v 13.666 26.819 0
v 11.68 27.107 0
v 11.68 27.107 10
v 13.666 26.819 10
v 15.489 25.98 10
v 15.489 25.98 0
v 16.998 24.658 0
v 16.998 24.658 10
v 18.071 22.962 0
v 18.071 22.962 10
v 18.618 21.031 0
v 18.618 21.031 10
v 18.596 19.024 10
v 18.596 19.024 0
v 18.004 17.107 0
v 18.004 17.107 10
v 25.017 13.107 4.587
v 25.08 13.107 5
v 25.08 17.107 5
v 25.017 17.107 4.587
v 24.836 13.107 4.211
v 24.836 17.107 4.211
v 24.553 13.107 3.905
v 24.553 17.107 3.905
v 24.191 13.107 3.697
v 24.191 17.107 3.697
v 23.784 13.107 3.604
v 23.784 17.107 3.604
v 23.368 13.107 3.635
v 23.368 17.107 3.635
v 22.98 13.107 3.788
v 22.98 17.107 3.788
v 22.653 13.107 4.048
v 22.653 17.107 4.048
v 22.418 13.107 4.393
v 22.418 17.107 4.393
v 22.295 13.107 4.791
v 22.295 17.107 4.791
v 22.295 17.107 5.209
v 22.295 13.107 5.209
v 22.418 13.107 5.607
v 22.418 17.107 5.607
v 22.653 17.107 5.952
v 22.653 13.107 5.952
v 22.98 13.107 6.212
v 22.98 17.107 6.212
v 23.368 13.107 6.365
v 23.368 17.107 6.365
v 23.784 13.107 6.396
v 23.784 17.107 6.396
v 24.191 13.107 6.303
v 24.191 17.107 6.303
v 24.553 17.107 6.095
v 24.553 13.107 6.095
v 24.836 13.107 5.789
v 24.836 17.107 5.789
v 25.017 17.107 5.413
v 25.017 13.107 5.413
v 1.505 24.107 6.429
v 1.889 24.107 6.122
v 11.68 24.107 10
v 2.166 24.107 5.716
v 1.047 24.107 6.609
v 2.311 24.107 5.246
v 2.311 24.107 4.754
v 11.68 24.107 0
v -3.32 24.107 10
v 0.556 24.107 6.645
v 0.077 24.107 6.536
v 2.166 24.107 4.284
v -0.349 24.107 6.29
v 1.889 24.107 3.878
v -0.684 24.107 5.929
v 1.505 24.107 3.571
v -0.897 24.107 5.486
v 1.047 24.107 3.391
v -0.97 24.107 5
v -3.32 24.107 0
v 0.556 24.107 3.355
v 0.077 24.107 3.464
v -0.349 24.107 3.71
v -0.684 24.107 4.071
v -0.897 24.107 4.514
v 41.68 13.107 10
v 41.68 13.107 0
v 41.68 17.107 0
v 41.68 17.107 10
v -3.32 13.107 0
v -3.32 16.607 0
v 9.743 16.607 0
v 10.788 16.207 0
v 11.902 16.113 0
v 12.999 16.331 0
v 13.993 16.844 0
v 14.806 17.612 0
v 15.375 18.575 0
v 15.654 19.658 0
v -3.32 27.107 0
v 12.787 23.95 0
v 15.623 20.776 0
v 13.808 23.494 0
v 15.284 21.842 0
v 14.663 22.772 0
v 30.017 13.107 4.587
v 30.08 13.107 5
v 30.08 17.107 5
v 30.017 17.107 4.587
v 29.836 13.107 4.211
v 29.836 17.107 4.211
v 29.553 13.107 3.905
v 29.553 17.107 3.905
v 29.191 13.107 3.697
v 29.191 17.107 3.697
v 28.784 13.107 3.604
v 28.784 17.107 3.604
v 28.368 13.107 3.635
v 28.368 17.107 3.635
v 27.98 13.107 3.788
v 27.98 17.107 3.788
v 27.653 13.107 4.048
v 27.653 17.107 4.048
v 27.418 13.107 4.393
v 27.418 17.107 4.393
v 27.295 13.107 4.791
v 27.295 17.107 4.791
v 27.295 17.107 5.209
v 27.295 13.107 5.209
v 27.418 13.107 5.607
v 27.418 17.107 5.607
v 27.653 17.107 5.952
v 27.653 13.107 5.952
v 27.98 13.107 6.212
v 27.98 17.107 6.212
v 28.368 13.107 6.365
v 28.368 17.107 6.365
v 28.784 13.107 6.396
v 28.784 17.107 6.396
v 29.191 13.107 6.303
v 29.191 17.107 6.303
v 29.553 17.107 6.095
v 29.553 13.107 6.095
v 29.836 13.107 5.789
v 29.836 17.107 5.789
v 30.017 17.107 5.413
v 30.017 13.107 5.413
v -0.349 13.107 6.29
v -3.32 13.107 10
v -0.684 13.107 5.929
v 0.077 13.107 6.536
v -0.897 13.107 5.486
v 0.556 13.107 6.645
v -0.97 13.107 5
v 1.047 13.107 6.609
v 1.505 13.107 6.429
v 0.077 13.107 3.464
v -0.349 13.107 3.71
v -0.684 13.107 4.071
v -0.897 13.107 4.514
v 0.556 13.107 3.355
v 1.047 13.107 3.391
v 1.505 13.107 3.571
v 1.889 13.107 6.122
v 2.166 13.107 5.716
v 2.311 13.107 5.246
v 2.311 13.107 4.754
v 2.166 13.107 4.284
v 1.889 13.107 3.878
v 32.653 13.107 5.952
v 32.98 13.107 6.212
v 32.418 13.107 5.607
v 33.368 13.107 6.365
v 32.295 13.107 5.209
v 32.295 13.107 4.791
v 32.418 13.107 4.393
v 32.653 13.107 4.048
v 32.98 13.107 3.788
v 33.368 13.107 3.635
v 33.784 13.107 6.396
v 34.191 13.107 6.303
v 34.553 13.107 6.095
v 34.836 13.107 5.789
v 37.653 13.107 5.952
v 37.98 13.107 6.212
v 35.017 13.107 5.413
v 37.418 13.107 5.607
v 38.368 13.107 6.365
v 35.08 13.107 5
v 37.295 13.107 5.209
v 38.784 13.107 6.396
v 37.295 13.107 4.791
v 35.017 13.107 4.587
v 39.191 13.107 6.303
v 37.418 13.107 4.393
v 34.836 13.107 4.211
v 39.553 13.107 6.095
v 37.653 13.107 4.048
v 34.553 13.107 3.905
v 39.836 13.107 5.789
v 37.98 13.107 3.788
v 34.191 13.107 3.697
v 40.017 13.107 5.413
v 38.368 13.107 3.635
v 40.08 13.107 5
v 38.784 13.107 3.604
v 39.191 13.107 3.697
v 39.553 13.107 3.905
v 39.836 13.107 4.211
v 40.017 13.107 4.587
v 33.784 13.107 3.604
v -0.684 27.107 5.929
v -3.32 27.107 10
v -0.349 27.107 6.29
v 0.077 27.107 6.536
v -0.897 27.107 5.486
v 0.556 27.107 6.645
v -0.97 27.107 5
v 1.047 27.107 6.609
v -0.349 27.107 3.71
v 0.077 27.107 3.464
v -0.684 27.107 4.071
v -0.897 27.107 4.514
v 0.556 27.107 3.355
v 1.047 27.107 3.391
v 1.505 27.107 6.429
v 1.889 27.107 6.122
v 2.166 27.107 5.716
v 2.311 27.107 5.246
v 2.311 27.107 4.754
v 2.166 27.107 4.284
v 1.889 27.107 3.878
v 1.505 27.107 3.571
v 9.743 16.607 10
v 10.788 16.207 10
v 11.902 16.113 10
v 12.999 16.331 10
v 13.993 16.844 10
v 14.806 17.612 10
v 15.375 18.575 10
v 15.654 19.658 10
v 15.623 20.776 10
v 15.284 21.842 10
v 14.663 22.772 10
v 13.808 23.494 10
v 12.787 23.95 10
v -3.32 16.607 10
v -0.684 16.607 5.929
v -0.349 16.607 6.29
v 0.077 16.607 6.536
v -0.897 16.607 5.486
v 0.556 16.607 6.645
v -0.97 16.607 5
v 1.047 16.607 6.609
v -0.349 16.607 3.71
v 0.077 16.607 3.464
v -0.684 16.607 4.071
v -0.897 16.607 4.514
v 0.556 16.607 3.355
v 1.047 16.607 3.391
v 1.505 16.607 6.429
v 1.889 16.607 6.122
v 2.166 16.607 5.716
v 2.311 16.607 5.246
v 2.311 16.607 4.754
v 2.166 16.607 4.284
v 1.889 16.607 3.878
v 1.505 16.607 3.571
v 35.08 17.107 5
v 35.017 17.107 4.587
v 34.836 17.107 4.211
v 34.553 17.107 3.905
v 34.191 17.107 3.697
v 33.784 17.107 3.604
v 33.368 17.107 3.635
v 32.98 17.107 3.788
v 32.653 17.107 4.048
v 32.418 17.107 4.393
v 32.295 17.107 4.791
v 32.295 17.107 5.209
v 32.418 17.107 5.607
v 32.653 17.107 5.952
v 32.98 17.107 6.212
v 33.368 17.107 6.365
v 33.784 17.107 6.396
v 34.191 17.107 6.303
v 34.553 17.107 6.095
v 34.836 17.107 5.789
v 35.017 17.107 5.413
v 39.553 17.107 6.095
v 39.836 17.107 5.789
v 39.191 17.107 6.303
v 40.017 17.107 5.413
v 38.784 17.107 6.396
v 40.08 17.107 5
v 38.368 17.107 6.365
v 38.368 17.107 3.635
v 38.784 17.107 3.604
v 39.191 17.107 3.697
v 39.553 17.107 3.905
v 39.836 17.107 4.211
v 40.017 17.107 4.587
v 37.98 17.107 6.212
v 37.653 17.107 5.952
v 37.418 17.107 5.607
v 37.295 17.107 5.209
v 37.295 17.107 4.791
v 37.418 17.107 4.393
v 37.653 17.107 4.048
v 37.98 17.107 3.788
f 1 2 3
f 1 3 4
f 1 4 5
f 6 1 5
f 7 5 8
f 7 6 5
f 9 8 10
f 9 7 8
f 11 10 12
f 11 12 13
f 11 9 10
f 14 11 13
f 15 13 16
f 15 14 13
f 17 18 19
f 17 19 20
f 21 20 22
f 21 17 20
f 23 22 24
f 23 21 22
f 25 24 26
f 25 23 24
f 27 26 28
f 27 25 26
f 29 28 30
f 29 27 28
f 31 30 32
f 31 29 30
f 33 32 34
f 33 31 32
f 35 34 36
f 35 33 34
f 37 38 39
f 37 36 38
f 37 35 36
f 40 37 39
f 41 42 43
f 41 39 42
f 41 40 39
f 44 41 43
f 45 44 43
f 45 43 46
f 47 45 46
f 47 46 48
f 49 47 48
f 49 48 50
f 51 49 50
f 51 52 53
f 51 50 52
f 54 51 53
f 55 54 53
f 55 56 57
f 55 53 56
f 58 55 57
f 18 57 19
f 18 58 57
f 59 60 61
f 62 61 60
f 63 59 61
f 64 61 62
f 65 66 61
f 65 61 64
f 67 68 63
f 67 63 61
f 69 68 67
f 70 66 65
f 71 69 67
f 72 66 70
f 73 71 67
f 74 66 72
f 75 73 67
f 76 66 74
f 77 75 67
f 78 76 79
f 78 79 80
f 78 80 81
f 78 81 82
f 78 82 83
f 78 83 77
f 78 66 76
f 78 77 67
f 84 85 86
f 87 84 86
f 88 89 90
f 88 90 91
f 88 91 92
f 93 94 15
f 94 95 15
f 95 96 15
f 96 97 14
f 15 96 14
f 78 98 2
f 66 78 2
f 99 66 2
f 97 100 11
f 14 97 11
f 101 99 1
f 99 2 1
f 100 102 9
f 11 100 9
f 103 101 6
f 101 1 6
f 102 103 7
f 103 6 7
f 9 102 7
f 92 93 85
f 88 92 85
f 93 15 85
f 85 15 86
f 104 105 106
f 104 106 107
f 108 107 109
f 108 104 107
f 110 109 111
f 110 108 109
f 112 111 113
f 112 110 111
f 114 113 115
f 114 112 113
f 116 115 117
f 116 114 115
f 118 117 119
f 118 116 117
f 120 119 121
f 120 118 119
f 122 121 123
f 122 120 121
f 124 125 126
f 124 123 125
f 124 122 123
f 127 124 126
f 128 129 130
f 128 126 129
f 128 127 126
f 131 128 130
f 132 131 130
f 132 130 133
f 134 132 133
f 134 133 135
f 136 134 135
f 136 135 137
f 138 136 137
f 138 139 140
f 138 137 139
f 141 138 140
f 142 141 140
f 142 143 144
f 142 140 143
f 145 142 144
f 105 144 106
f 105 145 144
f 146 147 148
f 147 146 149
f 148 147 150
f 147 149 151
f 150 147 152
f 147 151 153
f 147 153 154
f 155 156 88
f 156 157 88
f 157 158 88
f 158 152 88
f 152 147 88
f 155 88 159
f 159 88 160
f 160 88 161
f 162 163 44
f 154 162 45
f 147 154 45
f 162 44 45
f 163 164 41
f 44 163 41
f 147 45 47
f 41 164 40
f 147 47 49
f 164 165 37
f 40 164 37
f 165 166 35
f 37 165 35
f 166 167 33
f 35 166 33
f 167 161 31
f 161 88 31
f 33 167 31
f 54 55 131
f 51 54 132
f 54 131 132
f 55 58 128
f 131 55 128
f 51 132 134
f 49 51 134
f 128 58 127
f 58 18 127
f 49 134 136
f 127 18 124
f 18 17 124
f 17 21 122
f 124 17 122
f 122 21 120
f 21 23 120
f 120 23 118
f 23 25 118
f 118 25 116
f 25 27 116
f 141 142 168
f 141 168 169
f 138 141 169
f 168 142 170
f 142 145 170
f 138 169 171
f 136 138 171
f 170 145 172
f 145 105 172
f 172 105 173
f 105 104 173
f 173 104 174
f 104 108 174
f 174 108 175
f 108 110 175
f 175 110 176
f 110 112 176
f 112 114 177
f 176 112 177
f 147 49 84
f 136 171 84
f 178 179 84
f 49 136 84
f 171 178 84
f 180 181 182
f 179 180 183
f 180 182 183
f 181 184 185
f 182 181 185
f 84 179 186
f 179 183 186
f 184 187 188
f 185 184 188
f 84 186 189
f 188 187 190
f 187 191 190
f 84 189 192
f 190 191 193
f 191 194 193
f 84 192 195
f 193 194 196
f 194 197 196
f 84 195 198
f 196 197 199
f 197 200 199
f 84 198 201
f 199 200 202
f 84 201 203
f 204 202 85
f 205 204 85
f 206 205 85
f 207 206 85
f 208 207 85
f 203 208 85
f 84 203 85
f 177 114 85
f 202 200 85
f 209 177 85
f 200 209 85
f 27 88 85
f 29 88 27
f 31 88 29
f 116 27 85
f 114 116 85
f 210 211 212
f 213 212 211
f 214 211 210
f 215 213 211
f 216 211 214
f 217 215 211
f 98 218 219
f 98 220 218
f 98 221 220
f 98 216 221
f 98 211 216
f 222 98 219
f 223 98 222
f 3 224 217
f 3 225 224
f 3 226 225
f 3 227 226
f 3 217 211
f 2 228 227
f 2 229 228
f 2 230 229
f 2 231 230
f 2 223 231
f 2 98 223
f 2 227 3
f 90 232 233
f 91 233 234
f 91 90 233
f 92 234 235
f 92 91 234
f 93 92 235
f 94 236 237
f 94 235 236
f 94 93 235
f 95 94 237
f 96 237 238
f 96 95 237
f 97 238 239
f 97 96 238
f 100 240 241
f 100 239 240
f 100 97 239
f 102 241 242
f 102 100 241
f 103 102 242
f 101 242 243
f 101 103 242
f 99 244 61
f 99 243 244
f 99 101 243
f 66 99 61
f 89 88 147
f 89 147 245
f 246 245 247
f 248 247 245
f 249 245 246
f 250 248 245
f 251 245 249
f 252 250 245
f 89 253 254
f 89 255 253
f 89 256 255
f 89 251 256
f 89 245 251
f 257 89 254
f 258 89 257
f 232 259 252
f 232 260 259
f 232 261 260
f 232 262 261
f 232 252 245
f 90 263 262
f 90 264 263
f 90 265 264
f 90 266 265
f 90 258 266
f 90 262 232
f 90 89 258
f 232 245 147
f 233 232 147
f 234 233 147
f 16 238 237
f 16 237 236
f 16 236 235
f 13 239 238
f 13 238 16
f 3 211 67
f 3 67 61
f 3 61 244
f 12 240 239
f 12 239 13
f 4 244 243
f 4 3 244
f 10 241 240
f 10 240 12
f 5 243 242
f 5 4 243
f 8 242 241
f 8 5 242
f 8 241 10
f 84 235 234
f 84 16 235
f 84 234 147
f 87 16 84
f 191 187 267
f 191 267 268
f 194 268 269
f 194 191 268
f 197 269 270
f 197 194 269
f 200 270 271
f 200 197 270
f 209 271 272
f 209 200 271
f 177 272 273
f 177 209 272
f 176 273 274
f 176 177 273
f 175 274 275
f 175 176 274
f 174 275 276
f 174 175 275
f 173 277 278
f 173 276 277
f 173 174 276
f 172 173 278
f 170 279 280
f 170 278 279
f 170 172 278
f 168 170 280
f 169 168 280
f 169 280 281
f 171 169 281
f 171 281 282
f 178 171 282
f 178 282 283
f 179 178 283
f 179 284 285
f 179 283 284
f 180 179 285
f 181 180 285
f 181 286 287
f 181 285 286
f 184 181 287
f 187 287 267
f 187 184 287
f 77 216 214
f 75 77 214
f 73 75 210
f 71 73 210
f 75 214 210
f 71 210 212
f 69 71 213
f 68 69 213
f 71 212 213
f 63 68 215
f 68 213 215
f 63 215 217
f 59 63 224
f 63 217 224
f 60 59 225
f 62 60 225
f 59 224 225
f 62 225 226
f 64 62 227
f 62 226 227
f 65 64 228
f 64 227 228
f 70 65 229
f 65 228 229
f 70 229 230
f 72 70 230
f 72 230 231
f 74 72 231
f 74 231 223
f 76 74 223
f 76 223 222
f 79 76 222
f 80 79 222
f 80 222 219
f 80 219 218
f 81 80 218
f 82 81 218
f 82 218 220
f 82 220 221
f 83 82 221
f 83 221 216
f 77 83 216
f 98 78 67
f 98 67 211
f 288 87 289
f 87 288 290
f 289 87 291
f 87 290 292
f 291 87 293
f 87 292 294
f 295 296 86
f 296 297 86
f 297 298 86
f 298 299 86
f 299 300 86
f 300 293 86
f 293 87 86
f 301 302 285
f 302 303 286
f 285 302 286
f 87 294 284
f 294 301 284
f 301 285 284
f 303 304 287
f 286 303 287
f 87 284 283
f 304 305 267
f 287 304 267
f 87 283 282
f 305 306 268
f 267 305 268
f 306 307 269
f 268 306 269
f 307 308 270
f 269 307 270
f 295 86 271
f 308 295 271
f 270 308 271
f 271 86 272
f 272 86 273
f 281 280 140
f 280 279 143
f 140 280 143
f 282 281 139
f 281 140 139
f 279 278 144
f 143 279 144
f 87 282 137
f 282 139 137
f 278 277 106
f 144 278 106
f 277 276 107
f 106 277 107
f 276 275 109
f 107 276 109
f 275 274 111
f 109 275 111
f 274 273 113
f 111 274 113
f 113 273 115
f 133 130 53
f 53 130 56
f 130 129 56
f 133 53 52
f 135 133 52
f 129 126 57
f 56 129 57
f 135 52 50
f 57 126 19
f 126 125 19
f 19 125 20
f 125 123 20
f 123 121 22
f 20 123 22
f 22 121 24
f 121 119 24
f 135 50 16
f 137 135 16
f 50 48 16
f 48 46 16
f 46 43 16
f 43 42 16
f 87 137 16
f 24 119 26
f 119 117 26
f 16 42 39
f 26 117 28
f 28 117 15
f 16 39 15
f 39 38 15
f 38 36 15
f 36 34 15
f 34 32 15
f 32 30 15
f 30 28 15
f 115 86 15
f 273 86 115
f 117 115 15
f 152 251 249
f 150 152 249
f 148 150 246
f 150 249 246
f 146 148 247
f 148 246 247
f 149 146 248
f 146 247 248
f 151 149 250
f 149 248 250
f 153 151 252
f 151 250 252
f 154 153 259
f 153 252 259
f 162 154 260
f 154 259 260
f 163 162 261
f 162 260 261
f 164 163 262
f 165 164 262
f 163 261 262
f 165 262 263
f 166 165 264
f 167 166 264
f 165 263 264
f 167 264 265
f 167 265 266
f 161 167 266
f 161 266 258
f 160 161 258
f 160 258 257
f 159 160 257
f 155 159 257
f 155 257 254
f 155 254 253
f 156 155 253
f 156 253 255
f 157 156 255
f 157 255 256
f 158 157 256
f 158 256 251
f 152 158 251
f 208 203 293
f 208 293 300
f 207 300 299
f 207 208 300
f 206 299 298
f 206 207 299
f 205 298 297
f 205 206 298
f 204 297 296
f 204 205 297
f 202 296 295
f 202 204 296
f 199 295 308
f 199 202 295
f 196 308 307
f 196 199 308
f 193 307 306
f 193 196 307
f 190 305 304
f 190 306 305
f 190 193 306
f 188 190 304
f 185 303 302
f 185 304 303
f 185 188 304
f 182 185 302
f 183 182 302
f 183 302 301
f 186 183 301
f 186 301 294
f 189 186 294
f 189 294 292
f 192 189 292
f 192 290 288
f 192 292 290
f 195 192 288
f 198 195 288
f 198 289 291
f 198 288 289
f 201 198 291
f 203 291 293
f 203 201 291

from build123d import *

# Parameters (mm, degrees)
BOSS_EXTRUDE1_DEPTH     = 10
SKETCH2_R               = 1.65
CUT_EXTRUDE1_DEPTH      = 26.395491135
BOSS_EXTRUDE2_START     = -10
BOSS_EXTRUDE2_DEPTH     = 10
CUT_EXTRUDE3_DEPTH      = 10
CUT_EXTRUDE3_DEPTH_BACK = 10
SKETCH8_R               = 1.4
SKETCH9_R               = 1.65
CUT_EXTRUDE4_DEPTH      = 46.090984648


with BuildPart() as part:
    # Sketch1 → Boss-Extrude1 (new body)
    with BuildSketch(Plane.XY):
        with BuildLine():
            Line((11.679694055, 24.106798453), (-3.320305945, 24.106798453))
            Line((-3.320305945, 24.106798453), (-3.320305945, 27.106798453))
            Line((-3.320305945, 27.106798453), (11.679694055, 27.106798453))
            ThreePointArc((11.679694055, 27.106798453), (18.679694055, 20.106798453), (11.679694055, 13.106798453))
            Line((11.679694055, 13.106798453), (-3.320305945, 13.106798453))
            Line((-3.320305945, 13.106798453), (-3.320305945, 16.606798453))
            Line((-3.320305945, 16.606798453), (9.743202382, 16.606798453))
            ThreePointArc((9.743202382, 16.606798453), (15.552677401, 19.106798453), (11.679694055, 24.106798453))
        make_face()
    extrude(amount=BOSS_EXTRUDE1_DEPTH)

    # Sketch2 → Cut-Extrude1 (cut, through all)
    with BuildSketch(Plane(origin=(0, 27.106798453, 0), x_dir=(1, 0, 0), z_dir=(0, 1, 0))):
        with Locations(Location((0.679694055, -5, 0), (0, 0, 180))):
            Circle(SKETCH2_R)
    extrude(amount=-CUT_EXTRUDE1_DEPTH, mode=Mode.SUBTRACT)

    # Sketch5 → Boss-Extrude2 (add)
    with BuildSketch(Plane.XY.offset(10).offset(BOSS_EXTRUDE2_START)):
        with BuildLine():
            Line((41.679694055, 17.106798453), (14.325445366, 17.106798453))
            ThreePointArc((14.325445366, 17.106798453), (12.113586102, 16.130400875), (9.743202382, 16.606798453))
            Line((9.743202382, 16.606798453), (-3.320305945, 16.606798453))
            Line((-3.320305945, 16.606798453), (-3.320305945, 13.106798453))
            Line((-3.320305945, 13.106798453), (41.679694055, 13.106798453))
            Line((41.679694055, 13.106798453), (41.679694055, 17.106798453))
        make_face()
    extrude(amount=BOSS_EXTRUDE2_DEPTH)

    # Sketch8 → Cut-Extrude3 (cut, two sides: drawn at the far end of the back side and taken through both)
    with BuildSketch(Plane(origin=(0, 13.948922433, 0), x_dir=(1, 0, 0), z_dir=(0, 1, 0)).offset(-CUT_EXTRUDE3_DEPTH_BACK)):
        with Locations((28.679694055, -5)):
            Circle(SKETCH8_R)
        with Locations((38.679694055, -5)):
            Circle(SKETCH8_R)
        with Locations((23.679694055, -5)):
            Circle(SKETCH8_R)
        with Locations((33.679694055, -5)):
            Circle(SKETCH8_R)
    extrude(amount=CUT_EXTRUDE3_DEPTH + CUT_EXTRUDE3_DEPTH_BACK, mode=Mode.SUBTRACT)

    # Sketch9 → Cut-Extrude4 (cut, through all)
    with BuildSketch(Plane(origin=(0, 27.106798453, 0), x_dir=(1, 0, 0), z_dir=(0, 1, 0))):
        with Locations(Location((0.679694055, -5, 0), (0, 0, 180))):
            Circle(SKETCH9_R)
    extrude(amount=-CUT_EXTRUDE4_DEPTH, mode=Mode.SUBTRACT)


solid = part.part
